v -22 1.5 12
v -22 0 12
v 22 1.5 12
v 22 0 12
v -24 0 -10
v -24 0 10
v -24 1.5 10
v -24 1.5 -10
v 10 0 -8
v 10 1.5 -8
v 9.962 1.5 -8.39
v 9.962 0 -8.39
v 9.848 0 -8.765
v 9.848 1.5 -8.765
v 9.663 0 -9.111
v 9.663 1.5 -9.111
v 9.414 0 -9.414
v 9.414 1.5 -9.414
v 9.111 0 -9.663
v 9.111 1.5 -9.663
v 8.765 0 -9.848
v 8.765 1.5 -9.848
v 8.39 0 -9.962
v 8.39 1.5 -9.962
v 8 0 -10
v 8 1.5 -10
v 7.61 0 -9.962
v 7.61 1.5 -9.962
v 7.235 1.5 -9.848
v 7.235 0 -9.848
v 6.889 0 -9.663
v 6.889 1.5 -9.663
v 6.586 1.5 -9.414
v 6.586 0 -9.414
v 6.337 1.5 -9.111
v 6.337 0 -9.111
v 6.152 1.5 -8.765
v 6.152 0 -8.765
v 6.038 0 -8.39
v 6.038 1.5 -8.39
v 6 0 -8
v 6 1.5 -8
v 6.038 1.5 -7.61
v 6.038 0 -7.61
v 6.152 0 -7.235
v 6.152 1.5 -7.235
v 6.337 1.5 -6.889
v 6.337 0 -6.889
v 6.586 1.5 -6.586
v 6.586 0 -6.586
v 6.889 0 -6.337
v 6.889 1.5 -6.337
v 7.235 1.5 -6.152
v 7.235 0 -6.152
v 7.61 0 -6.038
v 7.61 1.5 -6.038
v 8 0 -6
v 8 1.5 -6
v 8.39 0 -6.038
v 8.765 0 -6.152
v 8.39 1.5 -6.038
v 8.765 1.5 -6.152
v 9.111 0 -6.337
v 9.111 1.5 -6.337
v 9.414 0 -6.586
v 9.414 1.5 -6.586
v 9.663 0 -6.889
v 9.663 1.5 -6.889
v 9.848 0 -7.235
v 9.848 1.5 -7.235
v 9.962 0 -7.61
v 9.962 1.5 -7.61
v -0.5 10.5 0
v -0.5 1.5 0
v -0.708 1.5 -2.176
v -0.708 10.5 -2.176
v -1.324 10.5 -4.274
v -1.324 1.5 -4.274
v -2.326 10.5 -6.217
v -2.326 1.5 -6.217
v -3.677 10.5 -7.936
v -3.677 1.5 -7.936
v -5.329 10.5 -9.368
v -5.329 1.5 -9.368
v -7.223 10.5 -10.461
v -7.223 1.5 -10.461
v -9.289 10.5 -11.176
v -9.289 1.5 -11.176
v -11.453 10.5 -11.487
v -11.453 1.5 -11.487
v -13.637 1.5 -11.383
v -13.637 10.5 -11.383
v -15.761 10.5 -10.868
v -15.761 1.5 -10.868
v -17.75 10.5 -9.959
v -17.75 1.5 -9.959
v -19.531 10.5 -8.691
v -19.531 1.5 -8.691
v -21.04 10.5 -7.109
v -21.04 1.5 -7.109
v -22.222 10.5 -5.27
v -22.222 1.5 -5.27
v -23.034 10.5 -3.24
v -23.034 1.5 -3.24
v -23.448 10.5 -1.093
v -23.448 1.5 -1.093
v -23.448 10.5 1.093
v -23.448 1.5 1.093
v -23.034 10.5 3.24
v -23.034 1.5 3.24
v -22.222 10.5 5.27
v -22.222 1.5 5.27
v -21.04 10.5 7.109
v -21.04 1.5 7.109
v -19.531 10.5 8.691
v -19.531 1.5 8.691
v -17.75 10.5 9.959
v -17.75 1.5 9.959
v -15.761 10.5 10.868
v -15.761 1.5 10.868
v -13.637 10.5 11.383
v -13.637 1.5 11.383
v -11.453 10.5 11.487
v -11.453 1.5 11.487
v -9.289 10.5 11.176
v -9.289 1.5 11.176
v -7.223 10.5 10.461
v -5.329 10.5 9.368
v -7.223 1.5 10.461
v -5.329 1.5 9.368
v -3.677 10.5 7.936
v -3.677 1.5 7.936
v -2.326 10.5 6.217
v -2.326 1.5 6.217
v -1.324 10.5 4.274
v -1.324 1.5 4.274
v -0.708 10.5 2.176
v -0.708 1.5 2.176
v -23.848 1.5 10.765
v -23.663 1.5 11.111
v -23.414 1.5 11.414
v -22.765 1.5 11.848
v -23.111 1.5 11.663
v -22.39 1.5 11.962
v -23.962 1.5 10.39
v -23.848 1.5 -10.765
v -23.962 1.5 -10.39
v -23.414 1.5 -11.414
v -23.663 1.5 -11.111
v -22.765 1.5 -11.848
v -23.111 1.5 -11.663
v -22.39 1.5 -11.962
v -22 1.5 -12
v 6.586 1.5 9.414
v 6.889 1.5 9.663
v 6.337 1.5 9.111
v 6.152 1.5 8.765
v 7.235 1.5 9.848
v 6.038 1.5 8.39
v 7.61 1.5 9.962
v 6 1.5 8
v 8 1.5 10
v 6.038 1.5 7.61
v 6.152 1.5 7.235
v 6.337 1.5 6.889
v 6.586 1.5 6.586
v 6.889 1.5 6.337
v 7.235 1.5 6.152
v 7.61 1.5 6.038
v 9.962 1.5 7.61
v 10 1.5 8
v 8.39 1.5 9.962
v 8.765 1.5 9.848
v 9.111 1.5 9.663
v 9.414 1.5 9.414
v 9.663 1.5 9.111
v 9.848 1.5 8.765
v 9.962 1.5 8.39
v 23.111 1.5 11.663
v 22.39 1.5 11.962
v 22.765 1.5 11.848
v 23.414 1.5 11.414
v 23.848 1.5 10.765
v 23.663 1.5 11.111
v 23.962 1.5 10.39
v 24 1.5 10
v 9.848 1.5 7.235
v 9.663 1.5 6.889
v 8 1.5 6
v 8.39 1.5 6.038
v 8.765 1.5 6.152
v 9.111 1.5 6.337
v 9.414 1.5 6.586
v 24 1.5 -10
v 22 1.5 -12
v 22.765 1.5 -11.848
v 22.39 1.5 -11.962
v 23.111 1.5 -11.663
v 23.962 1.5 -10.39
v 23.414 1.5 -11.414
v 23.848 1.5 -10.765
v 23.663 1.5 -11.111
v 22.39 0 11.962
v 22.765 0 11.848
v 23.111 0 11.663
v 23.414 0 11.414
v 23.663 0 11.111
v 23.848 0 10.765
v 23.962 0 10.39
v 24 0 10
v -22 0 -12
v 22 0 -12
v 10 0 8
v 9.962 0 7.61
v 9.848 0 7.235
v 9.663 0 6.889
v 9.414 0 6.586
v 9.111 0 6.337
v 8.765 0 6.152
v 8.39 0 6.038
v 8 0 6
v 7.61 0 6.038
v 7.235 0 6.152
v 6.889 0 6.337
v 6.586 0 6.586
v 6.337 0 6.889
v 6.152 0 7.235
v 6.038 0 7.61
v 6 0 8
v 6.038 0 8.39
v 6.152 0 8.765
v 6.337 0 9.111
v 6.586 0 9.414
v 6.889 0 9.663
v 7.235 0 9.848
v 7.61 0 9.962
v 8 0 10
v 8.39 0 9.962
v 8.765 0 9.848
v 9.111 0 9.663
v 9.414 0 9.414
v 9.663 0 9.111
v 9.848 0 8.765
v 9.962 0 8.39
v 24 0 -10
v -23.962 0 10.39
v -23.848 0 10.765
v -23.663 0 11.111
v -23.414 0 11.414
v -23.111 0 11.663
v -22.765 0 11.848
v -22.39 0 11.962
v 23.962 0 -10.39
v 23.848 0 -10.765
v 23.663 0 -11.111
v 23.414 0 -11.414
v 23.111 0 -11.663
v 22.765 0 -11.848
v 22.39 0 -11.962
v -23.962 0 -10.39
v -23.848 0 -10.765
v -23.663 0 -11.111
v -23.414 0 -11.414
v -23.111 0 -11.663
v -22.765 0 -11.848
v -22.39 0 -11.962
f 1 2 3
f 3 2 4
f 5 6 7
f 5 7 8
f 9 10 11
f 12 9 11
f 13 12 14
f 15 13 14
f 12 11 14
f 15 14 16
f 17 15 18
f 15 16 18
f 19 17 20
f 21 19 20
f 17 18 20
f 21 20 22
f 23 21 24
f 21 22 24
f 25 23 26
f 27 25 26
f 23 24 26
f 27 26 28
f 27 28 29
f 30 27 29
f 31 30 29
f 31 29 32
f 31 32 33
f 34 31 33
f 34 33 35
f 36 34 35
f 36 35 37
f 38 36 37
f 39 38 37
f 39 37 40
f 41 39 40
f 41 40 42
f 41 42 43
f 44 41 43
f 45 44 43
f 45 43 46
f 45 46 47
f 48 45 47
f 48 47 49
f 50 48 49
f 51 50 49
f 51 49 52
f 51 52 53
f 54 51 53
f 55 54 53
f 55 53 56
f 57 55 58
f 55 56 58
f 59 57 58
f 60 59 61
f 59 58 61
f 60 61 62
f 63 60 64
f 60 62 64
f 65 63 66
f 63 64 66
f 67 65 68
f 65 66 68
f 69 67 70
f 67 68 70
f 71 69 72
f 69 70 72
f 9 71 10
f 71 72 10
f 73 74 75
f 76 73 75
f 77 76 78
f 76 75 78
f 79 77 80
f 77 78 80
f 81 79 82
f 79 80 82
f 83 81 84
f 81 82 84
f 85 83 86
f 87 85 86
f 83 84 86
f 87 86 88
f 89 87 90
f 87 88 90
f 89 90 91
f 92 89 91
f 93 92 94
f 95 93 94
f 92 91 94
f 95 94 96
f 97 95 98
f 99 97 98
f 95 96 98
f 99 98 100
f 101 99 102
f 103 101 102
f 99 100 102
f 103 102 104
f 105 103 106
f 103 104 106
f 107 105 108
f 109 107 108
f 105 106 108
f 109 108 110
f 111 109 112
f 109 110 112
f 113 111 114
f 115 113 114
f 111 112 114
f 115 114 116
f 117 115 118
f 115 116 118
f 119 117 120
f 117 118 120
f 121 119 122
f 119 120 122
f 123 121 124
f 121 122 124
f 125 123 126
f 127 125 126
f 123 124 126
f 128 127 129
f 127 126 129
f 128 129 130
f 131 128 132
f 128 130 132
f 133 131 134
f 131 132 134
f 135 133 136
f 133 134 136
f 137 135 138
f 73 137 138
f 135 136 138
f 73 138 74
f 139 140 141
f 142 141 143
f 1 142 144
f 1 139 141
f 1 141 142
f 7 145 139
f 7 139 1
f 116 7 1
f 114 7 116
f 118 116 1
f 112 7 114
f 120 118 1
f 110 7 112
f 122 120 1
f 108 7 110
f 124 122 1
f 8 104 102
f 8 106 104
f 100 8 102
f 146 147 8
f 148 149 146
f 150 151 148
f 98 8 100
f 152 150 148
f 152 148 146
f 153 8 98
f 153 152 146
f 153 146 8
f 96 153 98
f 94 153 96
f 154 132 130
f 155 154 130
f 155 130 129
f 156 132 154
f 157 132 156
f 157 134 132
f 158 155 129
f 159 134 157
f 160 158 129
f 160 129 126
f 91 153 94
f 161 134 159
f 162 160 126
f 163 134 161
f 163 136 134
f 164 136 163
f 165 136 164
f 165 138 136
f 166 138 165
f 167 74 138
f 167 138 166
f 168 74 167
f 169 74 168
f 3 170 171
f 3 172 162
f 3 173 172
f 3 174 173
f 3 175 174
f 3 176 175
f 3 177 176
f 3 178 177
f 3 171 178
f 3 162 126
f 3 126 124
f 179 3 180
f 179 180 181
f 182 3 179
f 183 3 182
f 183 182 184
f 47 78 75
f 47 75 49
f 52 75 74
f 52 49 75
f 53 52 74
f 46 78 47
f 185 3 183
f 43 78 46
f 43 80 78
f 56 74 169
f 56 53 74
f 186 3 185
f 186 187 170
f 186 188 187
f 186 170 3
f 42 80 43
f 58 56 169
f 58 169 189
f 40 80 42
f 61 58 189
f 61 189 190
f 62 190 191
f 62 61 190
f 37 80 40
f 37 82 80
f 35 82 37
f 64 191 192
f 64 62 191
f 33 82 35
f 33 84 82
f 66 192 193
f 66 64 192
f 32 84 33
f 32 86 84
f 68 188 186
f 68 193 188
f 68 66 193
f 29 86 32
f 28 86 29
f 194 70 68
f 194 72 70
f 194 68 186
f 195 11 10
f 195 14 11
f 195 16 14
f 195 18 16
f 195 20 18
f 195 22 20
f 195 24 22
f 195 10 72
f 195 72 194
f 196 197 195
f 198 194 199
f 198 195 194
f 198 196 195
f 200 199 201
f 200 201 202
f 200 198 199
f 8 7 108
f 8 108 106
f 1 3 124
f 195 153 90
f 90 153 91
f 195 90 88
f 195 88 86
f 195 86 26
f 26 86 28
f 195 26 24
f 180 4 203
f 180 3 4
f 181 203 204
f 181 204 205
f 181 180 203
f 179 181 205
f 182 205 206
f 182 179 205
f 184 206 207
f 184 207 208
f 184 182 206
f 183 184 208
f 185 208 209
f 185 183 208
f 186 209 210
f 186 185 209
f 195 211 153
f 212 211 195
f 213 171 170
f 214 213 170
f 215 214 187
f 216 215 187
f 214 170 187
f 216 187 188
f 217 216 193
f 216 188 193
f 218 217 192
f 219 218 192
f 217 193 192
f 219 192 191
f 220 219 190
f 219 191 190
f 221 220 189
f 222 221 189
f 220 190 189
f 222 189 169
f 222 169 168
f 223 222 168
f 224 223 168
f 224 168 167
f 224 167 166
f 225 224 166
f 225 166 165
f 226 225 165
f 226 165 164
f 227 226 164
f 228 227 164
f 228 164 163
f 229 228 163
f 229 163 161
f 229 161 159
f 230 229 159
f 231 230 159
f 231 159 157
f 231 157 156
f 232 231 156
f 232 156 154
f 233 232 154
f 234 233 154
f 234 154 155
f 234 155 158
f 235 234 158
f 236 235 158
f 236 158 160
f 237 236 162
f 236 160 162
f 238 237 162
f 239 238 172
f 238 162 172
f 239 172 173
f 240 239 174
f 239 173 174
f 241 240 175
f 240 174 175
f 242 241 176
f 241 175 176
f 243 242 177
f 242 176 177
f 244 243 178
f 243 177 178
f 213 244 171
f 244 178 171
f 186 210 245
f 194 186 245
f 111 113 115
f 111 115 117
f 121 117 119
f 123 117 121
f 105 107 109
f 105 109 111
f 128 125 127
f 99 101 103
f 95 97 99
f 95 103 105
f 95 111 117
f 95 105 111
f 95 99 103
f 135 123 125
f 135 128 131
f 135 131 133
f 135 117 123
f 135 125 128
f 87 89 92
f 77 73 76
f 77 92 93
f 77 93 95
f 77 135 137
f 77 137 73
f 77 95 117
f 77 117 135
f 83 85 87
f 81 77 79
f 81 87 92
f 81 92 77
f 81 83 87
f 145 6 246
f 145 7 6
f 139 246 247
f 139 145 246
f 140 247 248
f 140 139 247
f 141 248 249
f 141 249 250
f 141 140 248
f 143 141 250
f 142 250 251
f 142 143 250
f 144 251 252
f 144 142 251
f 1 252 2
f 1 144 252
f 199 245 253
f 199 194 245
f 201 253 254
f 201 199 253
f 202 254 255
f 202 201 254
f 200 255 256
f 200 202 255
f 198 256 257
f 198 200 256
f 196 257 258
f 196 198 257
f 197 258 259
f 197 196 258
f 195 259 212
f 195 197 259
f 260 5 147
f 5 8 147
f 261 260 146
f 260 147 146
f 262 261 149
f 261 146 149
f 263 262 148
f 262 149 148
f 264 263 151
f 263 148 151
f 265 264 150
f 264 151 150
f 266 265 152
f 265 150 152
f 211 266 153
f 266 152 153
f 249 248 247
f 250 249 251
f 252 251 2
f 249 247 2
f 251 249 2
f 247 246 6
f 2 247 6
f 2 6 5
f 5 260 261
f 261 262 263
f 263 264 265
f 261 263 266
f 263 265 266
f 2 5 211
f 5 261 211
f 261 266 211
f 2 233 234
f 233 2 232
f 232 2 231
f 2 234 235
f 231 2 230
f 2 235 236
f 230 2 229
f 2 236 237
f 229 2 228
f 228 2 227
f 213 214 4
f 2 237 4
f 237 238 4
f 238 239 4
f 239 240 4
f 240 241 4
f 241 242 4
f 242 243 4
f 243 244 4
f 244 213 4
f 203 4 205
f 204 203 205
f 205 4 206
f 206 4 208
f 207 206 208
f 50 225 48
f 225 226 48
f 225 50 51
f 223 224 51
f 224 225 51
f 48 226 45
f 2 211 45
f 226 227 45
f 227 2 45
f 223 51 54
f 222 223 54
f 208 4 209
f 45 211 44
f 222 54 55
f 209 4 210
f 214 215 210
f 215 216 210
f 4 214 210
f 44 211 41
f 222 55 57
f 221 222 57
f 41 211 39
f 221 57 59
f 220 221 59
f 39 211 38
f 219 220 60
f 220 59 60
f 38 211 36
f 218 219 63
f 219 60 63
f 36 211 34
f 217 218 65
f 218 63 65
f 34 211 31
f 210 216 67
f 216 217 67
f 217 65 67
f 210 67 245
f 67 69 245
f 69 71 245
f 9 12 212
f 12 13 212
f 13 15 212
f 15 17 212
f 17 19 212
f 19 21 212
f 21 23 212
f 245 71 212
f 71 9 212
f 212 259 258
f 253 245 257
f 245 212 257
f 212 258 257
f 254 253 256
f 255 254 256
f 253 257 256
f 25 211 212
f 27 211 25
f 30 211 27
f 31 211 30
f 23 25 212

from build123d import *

# Parameters (mm, degrees)
SKETCH_1_W          = 48
SKETCH_1_H          = 24
EXTRUDE_1_DEPTH     = 1.5
FILLET_1_R          = 2
CUT_EXTRUDE_1_REACH = 3.5
SKETCH_2_R          = 2
SKETCH_3_R          = 11.5
EXTRUDE_2_DEPTH     = 9


with BuildPart() as part:
    # 草图1 → 凸台-拉伸1 (new body)
    with BuildSketch(Plane(origin=(0, 0, 0), x_dir=(1, 0, 0), z_dir=(0, 1, 0))):
        Rectangle(SKETCH_1_W, SKETCH_1_H)
    extrude(amount=EXTRUDE_1_DEPTH)

    # 圆角1
    fillet_1_edges = [part.edges().sort_by_distance(p)[0] for p in [
        (-24, 0.75, -12),
        (24, 0.75, -12),
        (24, 0.75, 12),
        (-24, 0.75, 12),
    ]]
    fillet(fillet_1_edges, radius=FILLET_1_R)

    # 草图2 → 切除-拉伸1 (cut, up to next)
    with BuildSketch(Plane(origin=(0, 1.5, 0), x_dir=(1, 0, 0), z_dir=(0, 1, 0)), mode=Mode.PRIVATE) as cut_extrude_1_sk1:
        with Locations((8, 8)):
            Circle(SKETCH_2_R)
    cut_extrude_1_tool1 = extrude(cut_extrude_1_sk1.sketch, amount=-CUT_EXTRUDE_1_REACH, mode=Mode.PRIVATE) & part.part
    add(cut_extrude_1_tool1.solids().sort_by_distance((8, 1.5, -8))[0], mode=Mode.SUBTRACT)
    # 草图2 → 切除-拉伸1 (cut, up to next)
    with BuildSketch(Plane(origin=(0, 1.5, 0), x_dir=(1, 0, 0), z_dir=(0, 1, 0)), mode=Mode.PRIVATE) as cut_extrude_1_sk2:
        with Locations((8, -8)):
            Circle(SKETCH_2_R)
    cut_extrude_1_tool2 = extrude(cut_extrude_1_sk2.sketch, amount=-CUT_EXTRUDE_1_REACH, mode=Mode.PRIVATE) & part.part
    add(cut_extrude_1_tool2.solids().sort_by_distance((8, 1.5, 8))[0], mode=Mode.SUBTRACT)

    # 草图3 → 凸台-拉伸2 (add)
    with BuildSketch(Plane(origin=(0, 1.5, 0), x_dir=(1, 0, 0), z_dir=(0, 1, 0))):
        with Locations((-12, 0)):
            Circle(SKETCH_3_R)
    extrude(amount=EXTRUDE_2_DEPTH)


solid = part.part
